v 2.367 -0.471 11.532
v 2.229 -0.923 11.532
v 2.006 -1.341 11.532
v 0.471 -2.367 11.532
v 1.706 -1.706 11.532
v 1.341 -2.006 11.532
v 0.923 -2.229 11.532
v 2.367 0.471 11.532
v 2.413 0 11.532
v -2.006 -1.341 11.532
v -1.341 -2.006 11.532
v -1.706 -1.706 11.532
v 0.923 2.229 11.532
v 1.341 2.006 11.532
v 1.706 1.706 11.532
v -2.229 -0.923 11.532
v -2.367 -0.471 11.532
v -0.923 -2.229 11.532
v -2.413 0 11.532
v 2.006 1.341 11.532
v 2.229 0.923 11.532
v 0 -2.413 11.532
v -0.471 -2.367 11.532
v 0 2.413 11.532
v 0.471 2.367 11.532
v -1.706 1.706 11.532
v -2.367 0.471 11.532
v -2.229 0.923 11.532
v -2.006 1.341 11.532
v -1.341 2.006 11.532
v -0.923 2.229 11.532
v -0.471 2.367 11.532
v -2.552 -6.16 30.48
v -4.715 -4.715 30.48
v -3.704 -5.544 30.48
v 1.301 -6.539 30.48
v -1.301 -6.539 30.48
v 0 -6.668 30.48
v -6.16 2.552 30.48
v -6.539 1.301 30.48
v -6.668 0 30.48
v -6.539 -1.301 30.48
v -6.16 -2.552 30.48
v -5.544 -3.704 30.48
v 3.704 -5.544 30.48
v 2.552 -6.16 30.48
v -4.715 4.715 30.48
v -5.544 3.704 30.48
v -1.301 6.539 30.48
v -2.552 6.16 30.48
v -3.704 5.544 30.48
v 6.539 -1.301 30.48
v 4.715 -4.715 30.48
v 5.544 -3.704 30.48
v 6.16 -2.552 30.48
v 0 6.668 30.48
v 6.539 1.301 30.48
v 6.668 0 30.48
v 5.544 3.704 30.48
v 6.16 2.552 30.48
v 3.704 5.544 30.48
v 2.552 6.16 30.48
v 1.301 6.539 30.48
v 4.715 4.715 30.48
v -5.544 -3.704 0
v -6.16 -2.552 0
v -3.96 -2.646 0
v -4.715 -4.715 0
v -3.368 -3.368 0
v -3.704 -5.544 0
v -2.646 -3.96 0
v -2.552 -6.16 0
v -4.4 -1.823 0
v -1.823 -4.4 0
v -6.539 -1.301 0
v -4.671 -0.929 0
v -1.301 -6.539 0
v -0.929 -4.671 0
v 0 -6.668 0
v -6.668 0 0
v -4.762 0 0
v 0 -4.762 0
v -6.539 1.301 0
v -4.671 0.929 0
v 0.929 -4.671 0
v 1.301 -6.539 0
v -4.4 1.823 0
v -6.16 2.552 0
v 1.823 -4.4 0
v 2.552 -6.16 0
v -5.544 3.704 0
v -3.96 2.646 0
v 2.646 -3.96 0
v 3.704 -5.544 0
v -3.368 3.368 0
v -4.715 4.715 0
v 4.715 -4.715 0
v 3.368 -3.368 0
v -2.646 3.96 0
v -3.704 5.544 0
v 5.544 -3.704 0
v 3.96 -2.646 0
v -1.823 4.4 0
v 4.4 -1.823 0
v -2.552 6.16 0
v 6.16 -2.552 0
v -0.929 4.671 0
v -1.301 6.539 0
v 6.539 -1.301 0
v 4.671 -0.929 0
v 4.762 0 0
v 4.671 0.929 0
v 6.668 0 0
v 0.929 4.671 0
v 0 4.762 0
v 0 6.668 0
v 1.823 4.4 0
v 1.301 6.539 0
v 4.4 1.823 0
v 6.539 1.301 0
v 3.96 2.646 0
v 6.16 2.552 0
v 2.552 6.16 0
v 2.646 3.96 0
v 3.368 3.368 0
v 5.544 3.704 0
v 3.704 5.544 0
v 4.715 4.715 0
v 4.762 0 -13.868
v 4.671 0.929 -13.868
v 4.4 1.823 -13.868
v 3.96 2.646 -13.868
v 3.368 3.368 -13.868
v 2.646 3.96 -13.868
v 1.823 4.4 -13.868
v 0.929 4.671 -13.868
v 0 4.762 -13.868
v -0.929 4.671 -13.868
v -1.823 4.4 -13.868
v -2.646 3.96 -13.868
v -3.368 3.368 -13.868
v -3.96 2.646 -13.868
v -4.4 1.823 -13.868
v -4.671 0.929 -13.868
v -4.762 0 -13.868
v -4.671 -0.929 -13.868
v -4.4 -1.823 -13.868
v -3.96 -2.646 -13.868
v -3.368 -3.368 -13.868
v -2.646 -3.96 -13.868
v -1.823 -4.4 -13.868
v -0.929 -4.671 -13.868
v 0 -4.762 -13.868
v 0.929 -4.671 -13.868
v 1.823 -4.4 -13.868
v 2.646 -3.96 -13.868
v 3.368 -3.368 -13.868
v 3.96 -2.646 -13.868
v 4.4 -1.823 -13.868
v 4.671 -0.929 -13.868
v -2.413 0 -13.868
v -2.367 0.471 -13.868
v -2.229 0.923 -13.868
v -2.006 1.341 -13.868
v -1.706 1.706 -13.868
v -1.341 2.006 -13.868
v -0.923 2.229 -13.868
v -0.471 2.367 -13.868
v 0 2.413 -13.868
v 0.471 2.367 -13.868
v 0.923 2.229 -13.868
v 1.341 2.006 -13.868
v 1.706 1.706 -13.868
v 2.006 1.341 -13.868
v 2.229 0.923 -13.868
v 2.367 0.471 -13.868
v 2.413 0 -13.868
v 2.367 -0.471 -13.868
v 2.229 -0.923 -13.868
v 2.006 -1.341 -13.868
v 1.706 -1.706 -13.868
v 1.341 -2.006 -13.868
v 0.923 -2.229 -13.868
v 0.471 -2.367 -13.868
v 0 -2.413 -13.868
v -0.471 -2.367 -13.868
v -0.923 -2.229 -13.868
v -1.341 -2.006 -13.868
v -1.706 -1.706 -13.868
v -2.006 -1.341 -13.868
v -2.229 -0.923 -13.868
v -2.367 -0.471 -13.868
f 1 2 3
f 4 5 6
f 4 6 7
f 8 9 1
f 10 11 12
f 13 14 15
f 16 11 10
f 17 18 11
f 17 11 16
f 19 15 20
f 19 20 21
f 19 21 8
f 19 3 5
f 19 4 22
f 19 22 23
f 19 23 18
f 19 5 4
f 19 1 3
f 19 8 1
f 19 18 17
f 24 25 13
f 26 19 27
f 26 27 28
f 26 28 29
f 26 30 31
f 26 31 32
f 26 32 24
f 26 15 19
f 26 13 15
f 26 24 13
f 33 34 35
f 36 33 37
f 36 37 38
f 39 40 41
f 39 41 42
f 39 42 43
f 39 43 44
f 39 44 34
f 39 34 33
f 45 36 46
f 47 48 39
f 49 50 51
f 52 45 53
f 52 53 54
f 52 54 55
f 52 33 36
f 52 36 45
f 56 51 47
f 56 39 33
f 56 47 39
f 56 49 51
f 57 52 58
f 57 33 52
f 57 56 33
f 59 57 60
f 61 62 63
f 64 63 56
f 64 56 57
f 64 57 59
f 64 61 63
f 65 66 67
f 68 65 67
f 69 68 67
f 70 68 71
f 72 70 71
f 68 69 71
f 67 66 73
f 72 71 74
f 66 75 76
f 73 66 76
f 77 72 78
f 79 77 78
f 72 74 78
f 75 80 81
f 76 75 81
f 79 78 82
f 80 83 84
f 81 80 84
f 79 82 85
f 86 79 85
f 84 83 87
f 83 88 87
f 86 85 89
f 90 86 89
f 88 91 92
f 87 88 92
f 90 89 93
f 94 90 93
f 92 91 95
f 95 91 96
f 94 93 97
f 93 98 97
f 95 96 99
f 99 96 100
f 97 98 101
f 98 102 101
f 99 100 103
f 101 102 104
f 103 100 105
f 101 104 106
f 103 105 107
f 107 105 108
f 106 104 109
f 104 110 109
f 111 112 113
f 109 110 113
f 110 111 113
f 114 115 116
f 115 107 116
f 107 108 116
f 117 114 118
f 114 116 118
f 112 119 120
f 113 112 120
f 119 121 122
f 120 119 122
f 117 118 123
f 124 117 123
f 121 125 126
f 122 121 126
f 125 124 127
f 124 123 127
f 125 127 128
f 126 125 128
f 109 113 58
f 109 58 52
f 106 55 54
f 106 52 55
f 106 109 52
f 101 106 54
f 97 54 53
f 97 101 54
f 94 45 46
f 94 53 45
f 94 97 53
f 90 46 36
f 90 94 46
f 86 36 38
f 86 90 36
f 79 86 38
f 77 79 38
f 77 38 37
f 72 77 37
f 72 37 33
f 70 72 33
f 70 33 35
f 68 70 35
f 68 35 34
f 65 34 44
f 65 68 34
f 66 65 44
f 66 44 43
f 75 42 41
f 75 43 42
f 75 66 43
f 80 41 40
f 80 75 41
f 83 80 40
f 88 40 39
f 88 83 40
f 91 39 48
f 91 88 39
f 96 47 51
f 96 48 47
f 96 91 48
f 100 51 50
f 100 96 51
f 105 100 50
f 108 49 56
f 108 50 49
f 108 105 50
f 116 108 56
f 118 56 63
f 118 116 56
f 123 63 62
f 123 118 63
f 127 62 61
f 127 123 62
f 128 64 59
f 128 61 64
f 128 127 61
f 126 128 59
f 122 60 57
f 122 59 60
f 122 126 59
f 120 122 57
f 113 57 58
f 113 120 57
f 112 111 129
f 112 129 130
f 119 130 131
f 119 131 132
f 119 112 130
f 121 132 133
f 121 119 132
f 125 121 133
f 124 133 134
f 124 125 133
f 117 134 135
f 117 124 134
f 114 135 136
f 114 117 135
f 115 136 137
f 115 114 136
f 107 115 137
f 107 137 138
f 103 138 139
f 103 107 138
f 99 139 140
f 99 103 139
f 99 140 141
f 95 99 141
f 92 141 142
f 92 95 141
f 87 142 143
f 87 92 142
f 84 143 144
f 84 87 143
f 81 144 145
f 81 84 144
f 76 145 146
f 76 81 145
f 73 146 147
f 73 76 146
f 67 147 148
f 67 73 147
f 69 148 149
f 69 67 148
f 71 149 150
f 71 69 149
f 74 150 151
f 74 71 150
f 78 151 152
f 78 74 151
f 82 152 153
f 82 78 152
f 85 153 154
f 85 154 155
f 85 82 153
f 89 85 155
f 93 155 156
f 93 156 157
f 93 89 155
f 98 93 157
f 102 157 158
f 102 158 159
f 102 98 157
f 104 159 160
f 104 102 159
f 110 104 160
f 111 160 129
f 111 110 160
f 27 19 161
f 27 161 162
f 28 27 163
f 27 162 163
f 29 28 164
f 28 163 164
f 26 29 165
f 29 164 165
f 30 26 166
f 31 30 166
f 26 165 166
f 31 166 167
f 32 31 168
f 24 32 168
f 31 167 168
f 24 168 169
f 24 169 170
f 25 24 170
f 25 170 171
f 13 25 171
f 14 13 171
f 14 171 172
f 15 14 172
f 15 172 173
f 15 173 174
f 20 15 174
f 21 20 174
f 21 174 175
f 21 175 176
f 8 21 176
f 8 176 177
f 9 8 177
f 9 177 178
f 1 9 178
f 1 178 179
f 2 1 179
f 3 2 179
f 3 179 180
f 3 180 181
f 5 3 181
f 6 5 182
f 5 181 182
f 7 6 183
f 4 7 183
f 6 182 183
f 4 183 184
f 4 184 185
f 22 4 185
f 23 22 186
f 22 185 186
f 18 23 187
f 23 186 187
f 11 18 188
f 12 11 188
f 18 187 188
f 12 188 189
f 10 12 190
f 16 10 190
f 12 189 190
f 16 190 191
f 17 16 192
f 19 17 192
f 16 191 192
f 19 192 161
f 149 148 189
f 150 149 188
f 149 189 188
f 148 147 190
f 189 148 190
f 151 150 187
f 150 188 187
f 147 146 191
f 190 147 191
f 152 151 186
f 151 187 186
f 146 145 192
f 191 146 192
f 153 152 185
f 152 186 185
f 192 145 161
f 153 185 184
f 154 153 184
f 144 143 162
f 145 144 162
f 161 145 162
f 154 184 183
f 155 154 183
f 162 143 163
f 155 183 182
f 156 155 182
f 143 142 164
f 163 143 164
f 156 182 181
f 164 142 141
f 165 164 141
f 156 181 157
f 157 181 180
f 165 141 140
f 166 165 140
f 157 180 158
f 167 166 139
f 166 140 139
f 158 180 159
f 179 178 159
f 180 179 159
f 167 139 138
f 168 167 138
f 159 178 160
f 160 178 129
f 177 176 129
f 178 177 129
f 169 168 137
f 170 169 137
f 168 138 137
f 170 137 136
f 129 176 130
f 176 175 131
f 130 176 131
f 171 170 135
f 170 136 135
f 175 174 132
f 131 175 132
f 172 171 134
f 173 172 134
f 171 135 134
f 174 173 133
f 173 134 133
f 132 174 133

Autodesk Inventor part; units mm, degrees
ref_plane "YZ Plane" through (0, 0, 0) normal (1, 0, 0) x (0, 1, 0)
ref_plane "XZ Plane" through (0, 0, 0) normal (0, 1, 0) x (-1, 0, 0)
ref_plane "XY Plane" through (0, 0, 0) normal (0, 0, 1) x (1, 0, 0)
sketch "Sketch1" plane through (0, 0, 0) normal (0, 0, 1) x (1, 0, 0)
  circle A0 centre (0, 0) radius 6.6675
  circle A1 centre (0, 0) radius 4.7625
  dimension "d0" = 13.335
  dimension "d1" = 9.525
extrude "Extrusion1" add sketch "Sketch1" against normal blind 13.8684 contours A1
extrude "Extrusion2" add sketch "Sketch1" along normal blind 30.48 contours A0 | A1
thread "Thread1" size "3/8-20 UN" class "2A" standard "ANSI Unified Screw Threads" full length
sketch "Sketch2" plane through (0, 0, -13.8684) normal (0, 0, -1) x (-1, 0, 0)
  circle A0 centre (0, 0) radius 4.7625 projected
  circle A1 centre (0, 0) radius 2.413
  dimension "d8" = 4.826
extrude "Extrusion3" cut sketch "Sketch2" against normal blind 25.4 contours A1
thread "Thread2" size "10-24 UNC" class "2B" standard "ANSI Unified Screw Threads" full length
properties part number "Gear housing shaft BD drill motor"
